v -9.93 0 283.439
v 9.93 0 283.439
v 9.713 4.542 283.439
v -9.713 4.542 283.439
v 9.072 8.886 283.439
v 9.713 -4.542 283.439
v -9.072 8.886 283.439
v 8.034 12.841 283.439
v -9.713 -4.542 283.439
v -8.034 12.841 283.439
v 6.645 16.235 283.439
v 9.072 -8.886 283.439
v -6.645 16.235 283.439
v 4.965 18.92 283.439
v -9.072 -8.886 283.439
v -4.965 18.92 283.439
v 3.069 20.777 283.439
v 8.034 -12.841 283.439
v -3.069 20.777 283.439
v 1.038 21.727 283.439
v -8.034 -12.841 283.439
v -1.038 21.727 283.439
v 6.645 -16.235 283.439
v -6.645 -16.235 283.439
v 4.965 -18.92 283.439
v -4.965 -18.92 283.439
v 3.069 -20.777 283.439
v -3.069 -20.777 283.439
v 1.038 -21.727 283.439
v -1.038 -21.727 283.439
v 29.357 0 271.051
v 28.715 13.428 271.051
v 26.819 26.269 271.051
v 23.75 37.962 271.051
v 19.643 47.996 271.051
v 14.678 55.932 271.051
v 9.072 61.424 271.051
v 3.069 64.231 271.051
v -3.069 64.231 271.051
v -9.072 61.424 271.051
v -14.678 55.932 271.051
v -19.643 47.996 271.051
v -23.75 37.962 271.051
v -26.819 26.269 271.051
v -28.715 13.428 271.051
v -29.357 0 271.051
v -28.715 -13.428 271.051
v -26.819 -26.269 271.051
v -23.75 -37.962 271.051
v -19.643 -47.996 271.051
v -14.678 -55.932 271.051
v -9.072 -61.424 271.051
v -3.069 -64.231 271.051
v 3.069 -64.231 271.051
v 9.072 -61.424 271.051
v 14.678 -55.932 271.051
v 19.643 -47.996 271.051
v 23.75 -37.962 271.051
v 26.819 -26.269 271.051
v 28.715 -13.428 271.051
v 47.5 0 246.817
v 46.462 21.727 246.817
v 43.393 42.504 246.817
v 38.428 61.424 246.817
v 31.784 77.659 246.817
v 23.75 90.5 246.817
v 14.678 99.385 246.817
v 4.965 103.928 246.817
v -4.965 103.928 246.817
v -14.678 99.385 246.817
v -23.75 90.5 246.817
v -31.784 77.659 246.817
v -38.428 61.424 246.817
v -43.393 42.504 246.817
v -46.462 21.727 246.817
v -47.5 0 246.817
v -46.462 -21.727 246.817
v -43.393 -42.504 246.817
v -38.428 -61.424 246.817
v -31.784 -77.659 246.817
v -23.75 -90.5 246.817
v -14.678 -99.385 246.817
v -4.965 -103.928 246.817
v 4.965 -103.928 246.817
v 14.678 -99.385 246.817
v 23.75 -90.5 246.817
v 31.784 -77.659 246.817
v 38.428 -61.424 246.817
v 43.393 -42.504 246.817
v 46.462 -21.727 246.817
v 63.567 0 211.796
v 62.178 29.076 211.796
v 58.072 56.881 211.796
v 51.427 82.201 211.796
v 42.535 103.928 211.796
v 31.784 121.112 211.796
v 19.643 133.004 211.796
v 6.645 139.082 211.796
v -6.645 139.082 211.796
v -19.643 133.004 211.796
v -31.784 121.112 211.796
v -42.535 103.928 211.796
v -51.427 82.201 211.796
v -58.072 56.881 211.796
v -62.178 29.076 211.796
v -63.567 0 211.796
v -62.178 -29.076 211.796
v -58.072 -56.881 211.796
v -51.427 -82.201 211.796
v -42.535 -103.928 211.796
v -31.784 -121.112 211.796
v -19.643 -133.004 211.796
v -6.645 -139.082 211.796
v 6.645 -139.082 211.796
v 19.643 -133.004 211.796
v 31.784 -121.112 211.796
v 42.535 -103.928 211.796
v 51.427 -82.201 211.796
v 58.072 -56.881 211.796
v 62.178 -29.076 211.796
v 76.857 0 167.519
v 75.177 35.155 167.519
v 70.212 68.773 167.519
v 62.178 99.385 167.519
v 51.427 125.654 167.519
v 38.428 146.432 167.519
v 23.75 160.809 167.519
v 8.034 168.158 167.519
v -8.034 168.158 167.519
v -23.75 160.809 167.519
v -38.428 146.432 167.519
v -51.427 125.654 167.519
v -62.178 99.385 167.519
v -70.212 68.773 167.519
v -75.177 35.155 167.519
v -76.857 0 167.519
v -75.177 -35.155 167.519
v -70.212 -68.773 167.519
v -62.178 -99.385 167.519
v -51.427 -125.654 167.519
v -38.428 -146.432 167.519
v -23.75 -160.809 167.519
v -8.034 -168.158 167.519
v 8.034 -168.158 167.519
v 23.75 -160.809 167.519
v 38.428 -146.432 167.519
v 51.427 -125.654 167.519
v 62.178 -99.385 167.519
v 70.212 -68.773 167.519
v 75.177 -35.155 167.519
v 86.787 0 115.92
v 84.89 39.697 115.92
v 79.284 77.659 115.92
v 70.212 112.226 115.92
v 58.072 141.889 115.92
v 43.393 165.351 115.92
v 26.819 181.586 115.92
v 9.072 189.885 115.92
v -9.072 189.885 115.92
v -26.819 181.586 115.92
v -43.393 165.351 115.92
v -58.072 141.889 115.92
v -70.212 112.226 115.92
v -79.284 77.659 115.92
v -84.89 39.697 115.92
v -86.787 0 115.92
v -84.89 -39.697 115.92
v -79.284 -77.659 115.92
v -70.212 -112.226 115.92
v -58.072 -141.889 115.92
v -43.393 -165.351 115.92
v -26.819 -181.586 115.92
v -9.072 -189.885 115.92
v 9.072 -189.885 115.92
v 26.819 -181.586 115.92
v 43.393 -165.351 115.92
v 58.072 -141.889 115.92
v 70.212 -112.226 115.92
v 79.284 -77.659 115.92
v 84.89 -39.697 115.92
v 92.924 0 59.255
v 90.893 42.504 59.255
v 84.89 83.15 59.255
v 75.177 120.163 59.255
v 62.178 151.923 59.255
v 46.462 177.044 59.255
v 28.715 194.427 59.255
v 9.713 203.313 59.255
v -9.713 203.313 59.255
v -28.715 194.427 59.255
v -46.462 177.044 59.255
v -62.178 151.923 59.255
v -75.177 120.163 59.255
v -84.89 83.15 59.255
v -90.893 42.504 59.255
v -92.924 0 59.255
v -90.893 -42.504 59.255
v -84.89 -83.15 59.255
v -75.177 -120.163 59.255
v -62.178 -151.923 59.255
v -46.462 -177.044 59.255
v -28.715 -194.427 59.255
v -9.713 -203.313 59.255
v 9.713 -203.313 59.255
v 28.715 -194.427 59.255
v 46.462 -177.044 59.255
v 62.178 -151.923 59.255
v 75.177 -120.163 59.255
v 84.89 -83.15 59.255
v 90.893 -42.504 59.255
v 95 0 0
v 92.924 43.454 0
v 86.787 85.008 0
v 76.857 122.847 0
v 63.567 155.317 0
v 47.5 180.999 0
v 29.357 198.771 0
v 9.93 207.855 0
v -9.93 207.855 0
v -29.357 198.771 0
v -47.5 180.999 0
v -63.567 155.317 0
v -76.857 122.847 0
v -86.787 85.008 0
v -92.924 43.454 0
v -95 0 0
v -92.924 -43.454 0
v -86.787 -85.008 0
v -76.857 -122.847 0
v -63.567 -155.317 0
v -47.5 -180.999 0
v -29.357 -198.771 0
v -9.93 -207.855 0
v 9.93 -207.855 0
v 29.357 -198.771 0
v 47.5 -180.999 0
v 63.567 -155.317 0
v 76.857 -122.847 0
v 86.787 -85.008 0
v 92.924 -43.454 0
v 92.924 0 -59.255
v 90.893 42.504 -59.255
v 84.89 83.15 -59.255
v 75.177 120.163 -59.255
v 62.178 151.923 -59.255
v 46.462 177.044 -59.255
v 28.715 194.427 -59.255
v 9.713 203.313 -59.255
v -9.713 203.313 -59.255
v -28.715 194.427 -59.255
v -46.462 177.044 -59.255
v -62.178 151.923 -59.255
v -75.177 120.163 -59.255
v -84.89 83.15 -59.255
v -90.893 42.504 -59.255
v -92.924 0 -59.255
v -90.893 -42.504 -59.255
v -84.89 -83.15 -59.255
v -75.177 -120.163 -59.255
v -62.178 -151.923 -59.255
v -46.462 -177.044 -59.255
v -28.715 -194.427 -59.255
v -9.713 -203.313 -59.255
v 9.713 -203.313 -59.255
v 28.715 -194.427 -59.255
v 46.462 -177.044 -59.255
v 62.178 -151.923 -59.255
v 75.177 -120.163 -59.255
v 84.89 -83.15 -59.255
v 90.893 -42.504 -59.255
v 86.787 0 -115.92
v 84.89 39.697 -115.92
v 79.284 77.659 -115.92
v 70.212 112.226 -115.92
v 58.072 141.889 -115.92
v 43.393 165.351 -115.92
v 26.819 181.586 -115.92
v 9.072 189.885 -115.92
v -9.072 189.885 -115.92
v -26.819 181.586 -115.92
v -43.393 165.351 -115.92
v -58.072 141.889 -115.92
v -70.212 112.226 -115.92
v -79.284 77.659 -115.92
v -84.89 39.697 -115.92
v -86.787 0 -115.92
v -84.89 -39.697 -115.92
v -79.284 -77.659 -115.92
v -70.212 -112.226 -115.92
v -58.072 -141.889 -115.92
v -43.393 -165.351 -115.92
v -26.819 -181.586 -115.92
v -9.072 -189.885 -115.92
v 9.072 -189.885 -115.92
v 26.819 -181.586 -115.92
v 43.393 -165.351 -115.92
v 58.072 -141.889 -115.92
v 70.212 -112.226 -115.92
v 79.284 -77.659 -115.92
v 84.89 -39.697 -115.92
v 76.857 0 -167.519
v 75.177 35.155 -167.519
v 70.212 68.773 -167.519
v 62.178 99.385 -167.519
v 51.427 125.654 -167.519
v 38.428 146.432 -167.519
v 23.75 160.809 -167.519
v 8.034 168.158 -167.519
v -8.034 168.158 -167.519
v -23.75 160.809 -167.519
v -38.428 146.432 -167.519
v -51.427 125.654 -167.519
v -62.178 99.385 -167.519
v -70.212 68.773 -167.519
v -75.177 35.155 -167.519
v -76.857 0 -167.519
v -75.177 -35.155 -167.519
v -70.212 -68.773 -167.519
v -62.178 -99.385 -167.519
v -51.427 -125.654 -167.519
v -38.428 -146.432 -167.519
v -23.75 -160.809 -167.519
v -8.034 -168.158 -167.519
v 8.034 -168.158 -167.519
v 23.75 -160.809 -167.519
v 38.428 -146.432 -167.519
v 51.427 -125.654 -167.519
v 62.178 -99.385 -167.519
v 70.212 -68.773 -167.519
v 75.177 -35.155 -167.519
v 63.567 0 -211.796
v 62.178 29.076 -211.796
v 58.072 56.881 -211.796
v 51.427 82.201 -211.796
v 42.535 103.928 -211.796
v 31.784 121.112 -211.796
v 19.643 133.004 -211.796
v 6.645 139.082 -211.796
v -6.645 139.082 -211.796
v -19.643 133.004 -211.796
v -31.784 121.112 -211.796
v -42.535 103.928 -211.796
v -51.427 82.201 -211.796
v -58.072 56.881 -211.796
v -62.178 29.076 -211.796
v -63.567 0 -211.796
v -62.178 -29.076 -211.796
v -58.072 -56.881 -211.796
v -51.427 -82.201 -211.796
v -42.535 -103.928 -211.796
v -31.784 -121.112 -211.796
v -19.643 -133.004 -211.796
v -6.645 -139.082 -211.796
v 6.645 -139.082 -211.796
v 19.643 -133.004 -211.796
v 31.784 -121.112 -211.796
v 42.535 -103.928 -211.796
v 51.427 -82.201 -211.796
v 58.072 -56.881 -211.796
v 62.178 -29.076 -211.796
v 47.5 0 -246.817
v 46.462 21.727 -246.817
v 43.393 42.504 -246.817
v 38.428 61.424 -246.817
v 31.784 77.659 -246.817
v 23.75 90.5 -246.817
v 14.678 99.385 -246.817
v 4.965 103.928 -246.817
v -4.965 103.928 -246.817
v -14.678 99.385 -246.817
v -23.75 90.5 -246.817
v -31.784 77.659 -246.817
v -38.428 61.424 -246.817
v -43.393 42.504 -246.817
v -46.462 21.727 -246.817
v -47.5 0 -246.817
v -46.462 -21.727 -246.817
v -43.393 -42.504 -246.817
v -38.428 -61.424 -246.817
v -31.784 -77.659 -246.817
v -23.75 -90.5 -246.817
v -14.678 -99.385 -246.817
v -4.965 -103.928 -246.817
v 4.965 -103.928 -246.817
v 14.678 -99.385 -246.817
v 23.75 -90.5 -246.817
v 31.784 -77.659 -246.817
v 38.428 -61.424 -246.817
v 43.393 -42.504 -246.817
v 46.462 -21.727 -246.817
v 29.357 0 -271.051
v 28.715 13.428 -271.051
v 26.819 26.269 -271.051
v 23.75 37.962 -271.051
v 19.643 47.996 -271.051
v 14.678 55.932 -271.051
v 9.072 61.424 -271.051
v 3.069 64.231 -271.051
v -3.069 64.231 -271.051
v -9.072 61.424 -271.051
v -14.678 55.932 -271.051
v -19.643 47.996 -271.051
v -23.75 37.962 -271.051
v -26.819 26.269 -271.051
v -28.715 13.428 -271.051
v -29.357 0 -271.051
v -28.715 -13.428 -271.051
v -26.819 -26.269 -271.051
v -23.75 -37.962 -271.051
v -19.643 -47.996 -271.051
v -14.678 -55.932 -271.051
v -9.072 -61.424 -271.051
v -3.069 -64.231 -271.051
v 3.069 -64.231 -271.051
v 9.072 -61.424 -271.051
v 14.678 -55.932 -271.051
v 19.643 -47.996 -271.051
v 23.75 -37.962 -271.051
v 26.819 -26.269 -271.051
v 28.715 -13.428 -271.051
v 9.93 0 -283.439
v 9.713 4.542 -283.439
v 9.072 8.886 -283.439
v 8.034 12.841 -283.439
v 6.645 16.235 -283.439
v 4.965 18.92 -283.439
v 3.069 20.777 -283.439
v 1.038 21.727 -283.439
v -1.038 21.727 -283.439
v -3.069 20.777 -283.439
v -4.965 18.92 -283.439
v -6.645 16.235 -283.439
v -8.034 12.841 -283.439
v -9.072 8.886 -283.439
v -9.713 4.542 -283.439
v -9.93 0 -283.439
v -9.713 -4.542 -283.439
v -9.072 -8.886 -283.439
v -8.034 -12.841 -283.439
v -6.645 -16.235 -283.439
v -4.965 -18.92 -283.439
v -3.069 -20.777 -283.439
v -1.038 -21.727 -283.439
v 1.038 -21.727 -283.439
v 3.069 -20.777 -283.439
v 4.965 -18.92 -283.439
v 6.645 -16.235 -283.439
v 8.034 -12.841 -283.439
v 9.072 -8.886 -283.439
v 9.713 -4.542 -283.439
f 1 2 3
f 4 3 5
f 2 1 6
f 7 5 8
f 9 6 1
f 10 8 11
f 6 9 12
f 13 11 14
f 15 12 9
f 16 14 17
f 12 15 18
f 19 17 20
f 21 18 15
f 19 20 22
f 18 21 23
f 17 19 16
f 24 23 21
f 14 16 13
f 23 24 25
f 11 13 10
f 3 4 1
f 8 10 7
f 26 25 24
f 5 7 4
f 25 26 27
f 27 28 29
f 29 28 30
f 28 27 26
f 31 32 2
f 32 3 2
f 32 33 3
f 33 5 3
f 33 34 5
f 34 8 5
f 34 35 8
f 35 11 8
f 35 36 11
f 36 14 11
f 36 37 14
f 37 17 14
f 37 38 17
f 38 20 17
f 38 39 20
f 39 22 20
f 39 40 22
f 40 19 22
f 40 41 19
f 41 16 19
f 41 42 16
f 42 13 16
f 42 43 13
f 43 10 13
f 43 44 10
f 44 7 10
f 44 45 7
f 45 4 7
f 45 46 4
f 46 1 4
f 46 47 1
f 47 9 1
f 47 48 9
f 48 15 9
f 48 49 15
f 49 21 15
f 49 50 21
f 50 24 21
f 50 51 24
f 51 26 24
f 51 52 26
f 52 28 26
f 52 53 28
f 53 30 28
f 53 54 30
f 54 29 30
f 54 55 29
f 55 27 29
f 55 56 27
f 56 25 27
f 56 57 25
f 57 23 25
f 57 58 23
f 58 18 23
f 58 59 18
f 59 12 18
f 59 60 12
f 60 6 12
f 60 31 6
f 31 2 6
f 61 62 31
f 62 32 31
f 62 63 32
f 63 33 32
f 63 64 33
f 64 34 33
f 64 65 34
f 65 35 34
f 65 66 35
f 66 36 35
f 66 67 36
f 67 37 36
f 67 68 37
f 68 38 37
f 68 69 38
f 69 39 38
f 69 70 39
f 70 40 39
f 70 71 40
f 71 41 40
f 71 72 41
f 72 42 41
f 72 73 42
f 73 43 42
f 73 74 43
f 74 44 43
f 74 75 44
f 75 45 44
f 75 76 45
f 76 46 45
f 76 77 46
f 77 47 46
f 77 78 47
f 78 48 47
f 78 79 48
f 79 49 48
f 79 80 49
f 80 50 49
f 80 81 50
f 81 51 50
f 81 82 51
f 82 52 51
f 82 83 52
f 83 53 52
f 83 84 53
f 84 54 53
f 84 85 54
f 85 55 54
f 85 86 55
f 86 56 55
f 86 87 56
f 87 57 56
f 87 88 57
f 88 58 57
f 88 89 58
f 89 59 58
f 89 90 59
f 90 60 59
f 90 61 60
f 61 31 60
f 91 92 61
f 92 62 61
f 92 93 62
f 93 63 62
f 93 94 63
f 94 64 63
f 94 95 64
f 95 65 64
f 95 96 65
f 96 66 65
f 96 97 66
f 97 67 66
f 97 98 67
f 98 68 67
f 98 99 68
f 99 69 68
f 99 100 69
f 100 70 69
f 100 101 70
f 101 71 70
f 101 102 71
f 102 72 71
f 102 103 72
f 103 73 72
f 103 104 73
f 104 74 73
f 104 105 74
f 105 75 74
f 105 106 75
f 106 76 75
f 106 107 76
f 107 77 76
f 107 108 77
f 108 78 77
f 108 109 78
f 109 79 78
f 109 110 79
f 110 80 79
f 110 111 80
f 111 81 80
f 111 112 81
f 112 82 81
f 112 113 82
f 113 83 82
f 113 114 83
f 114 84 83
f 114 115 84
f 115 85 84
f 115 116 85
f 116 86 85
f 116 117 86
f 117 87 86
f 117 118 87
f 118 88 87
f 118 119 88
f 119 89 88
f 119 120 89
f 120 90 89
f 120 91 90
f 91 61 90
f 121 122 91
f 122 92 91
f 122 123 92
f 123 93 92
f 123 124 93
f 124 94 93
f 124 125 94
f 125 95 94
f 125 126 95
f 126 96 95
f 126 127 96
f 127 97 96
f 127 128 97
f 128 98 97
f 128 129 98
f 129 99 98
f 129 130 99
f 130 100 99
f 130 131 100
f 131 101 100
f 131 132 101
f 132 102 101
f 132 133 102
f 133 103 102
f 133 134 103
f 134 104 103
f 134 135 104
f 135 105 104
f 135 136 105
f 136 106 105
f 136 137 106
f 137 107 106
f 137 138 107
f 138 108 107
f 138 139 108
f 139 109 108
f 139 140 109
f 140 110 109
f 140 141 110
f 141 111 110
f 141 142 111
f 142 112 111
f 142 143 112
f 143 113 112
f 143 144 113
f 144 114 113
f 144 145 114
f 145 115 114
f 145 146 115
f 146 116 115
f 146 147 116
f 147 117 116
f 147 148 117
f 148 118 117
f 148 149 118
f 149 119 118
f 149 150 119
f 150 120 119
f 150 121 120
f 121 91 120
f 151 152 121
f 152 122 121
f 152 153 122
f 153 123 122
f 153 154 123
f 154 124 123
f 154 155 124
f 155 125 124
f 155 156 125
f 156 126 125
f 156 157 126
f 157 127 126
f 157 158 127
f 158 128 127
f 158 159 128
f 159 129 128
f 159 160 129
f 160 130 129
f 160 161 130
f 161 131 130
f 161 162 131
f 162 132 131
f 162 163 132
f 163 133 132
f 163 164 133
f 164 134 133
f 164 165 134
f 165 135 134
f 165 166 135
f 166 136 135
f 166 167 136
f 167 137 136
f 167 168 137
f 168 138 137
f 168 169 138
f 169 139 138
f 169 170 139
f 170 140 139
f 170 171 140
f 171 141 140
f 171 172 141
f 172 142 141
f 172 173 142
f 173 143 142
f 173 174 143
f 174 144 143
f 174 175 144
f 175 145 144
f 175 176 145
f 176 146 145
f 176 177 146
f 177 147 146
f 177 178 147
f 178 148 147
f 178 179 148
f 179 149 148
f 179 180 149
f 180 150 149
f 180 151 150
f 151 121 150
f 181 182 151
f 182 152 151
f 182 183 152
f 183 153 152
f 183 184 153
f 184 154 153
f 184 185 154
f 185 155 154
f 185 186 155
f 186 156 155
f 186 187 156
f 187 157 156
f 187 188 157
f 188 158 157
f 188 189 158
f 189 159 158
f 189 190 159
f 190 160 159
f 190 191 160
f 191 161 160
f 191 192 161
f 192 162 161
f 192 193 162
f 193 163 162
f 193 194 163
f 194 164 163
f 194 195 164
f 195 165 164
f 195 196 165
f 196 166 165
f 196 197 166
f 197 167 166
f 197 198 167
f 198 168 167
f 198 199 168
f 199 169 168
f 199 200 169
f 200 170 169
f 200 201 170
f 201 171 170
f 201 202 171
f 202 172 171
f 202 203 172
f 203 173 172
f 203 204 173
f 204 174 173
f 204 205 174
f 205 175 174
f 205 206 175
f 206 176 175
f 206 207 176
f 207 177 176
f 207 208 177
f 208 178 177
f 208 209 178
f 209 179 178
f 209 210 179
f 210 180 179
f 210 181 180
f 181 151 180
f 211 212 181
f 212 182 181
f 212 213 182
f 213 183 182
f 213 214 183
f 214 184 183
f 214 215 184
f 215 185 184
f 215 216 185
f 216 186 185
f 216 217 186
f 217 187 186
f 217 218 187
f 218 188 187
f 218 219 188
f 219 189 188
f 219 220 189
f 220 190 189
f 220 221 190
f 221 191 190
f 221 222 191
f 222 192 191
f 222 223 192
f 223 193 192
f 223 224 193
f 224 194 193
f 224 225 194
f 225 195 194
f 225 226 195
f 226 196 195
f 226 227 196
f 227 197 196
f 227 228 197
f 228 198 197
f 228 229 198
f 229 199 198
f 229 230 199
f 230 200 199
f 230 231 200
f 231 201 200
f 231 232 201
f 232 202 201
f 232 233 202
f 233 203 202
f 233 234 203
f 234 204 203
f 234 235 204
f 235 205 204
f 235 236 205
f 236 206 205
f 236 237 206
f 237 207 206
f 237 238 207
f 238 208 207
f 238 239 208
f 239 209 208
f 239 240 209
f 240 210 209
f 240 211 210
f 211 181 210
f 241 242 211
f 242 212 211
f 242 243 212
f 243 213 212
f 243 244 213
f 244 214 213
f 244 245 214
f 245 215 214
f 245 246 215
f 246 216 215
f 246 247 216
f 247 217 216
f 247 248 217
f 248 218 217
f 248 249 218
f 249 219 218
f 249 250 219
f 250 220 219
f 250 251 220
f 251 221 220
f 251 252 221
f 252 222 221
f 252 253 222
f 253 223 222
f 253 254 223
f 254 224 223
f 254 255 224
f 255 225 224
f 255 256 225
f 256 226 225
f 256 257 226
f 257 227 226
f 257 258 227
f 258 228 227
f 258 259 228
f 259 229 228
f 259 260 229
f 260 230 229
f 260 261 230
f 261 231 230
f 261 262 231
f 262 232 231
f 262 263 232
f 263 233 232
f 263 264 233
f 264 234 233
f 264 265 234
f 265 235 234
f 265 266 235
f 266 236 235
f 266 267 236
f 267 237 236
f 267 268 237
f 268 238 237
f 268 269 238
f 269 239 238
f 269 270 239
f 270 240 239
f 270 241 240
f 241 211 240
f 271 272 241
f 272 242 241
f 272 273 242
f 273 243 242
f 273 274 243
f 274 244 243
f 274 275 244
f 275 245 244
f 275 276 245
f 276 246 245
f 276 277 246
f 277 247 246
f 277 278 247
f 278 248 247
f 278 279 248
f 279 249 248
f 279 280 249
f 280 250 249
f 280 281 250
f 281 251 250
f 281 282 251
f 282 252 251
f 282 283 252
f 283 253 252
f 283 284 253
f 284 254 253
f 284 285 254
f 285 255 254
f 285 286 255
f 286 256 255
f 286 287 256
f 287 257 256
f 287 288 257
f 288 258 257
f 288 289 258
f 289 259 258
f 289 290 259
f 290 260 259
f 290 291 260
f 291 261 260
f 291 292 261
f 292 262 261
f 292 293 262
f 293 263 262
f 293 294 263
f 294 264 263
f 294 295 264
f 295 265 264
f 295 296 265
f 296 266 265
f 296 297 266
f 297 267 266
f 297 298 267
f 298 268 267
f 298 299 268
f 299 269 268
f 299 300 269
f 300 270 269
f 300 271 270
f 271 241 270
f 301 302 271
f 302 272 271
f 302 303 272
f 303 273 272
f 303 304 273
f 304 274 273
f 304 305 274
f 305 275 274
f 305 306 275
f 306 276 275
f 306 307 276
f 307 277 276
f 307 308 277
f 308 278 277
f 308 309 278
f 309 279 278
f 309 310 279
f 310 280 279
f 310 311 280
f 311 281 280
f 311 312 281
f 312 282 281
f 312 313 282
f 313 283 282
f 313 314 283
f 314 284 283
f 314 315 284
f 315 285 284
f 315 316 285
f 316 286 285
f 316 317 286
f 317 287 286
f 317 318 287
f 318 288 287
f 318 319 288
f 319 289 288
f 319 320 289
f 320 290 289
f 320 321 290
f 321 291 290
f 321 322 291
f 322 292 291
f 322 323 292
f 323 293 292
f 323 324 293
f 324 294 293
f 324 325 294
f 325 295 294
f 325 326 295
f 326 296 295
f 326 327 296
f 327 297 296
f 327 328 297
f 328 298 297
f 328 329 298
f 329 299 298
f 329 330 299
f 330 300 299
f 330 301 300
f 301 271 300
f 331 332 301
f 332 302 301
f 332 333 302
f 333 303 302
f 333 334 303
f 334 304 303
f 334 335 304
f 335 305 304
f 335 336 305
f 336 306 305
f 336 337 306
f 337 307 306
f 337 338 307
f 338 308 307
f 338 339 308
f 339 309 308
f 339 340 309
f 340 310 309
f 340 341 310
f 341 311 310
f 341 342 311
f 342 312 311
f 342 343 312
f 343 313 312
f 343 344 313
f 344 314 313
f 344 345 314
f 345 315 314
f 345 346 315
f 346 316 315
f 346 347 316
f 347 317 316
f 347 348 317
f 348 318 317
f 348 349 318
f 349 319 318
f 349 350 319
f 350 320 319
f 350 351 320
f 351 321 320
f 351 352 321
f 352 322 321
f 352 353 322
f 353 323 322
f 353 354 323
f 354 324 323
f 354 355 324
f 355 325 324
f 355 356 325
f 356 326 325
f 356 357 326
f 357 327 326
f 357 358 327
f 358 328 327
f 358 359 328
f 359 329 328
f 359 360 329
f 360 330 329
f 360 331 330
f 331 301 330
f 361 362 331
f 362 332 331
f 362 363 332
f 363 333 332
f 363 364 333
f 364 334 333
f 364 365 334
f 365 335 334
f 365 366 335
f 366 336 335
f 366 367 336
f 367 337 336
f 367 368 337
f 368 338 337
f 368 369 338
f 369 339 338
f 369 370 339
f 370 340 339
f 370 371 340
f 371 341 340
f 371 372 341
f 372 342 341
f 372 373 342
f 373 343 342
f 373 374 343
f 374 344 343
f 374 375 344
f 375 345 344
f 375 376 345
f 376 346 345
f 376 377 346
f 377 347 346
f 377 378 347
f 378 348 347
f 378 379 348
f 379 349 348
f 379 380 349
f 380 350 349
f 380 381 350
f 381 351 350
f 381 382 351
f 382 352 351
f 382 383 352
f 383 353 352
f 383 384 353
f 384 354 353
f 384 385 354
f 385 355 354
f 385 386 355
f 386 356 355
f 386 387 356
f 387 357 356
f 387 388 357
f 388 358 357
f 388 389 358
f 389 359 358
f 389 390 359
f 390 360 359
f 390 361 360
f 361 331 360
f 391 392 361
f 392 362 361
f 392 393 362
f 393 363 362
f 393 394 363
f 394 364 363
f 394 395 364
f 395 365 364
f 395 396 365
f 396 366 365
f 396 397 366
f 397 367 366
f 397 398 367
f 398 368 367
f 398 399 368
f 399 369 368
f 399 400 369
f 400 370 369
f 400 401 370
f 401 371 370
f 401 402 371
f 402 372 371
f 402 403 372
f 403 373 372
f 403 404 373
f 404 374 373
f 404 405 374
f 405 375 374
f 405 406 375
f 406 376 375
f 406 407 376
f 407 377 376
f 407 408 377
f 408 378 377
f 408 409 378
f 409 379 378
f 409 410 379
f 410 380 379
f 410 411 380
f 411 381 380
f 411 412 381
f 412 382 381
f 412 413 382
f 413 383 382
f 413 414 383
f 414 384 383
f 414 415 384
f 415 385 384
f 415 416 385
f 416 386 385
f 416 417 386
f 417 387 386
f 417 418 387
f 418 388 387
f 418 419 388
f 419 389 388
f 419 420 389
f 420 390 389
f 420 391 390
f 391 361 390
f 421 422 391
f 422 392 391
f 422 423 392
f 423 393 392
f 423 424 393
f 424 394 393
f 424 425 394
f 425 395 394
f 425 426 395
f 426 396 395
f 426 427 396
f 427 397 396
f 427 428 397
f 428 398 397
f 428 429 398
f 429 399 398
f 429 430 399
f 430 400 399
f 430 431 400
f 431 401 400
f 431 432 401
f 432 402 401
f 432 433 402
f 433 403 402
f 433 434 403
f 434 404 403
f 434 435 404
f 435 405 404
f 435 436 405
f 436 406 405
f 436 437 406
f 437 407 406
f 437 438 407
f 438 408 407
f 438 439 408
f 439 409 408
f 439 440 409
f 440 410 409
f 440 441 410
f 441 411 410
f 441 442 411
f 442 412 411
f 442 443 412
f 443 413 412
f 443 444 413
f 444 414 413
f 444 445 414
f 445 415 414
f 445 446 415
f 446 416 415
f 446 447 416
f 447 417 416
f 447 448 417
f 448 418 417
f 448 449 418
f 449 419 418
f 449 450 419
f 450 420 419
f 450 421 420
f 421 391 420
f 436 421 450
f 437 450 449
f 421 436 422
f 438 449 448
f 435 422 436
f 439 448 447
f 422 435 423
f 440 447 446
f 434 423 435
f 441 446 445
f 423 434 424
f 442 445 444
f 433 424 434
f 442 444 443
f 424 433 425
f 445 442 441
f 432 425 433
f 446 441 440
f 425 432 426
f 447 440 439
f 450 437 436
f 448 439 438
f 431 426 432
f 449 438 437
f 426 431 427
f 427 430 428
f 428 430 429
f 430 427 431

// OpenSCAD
// Generated by SolidPython 1.0.1 on 2020-07-29 00:39:26


scale(v = [5, 11, 15]) {
	sphere(r = 19);
}
/***********************************************
*********      SolidPython code:      **********
************************************************
 
# import packages: SolidPython
from solid import *
from solid.utils import *
from itertools import chain, combinations


class Resize:

    def __init__(self, scad_file):
        self.scad_file = scad_file
        #self.scad_file = import_scad(scad_file)
        # cone/cylinder param:
        self.r1 = 0
        self.r2 = 0
        self.h = 0
        # rectangular prism param:
        self.w = 0
        self.l = 0
        # ellipse param:
        self.r = 0

    # import OpenScad code (file name corresponds to shape)


    # classify shape + parameters
    def assign(self, param1, param2, param3):
        if self.scad_file == 'cone.scad':
            self.r1 = param1
            self.r2 = param2
            self.h = param3
        elif self.scad_file == 'cylinder.scad':
            self.r1 = param1
            self.r2 = param2
            self.h = param3
        elif self.scad_file == 'rectangularPrism.scad':
            self.h = param1
            self.l = param2
            self.w = param3
        else:
            self.r = param1
            self.h = param2

    # resize parameters
    def iterate(self):
        x = range(3, 20, 2)
        i = 1
        if self.scad_file == 'cone.scad':
            tempList = list(combinations(x, 2))
            for temp in tempList:
                param1 = temp[0]
                param2 = temp[1]
                filepath = 'produced_scad_files/' + 'cone' + str(param1) + '_' + str(param2) + '_' + '.scad'
                scad_render_to_file(cylinder(h=param1, r1=param2, r2=0), filepath)

        elif self.scad_file == 'cylinder.scad':
            tempList = list(combinations(x, 3))
            for temp in tempList:
                param1 = temp[0]
                param2 = temp[1]
                filepath = 'produced_scad_files/' + 'cylinder' + str(param1) + '_' + str(param2) + '_' + '.scad'
                scad_render_to_file(cylinder(h=param1, r1=param2, r2=param2), filepath)

        elif self.scad_file == 'rectangularPrism.scad':
            tempList = list(combinations(x, 3))
            for temp in tempList:
                param1 = temp[0]
                param2 = temp[1]
                param3 = temp[2]
                filepath = 'produced_scad_files/' + 'rectangularPrism' + str(param1) + '_' + str(param2) + '_' + str(
                    param3) + '.scad'
                scad_render_to_file(cube(size=(param1, param2, param3)), filepath)

        elif self.scad_file == 'ellipse.scad':
            tempList = list(combinations(x, 4))
            for temp in tempList:
                param1 = temp[0]
                param2 = temp[1]
                param3 = temp[2]
                param4 = temp[3]
                filepath = 'produced_scad_files/' + 'ellipse' + str(param1) + '_' + str(param2) + '_' + str(param3) + '_' + str(param4) + '.scad'
                scad_render_to_file(scale([param1, param2, param3])(sphere(r=param4)), filepath)

    def render_to_scadfile(self):
        scad_render_to_file(scad, 'example.scad') 
 
************************************************/
